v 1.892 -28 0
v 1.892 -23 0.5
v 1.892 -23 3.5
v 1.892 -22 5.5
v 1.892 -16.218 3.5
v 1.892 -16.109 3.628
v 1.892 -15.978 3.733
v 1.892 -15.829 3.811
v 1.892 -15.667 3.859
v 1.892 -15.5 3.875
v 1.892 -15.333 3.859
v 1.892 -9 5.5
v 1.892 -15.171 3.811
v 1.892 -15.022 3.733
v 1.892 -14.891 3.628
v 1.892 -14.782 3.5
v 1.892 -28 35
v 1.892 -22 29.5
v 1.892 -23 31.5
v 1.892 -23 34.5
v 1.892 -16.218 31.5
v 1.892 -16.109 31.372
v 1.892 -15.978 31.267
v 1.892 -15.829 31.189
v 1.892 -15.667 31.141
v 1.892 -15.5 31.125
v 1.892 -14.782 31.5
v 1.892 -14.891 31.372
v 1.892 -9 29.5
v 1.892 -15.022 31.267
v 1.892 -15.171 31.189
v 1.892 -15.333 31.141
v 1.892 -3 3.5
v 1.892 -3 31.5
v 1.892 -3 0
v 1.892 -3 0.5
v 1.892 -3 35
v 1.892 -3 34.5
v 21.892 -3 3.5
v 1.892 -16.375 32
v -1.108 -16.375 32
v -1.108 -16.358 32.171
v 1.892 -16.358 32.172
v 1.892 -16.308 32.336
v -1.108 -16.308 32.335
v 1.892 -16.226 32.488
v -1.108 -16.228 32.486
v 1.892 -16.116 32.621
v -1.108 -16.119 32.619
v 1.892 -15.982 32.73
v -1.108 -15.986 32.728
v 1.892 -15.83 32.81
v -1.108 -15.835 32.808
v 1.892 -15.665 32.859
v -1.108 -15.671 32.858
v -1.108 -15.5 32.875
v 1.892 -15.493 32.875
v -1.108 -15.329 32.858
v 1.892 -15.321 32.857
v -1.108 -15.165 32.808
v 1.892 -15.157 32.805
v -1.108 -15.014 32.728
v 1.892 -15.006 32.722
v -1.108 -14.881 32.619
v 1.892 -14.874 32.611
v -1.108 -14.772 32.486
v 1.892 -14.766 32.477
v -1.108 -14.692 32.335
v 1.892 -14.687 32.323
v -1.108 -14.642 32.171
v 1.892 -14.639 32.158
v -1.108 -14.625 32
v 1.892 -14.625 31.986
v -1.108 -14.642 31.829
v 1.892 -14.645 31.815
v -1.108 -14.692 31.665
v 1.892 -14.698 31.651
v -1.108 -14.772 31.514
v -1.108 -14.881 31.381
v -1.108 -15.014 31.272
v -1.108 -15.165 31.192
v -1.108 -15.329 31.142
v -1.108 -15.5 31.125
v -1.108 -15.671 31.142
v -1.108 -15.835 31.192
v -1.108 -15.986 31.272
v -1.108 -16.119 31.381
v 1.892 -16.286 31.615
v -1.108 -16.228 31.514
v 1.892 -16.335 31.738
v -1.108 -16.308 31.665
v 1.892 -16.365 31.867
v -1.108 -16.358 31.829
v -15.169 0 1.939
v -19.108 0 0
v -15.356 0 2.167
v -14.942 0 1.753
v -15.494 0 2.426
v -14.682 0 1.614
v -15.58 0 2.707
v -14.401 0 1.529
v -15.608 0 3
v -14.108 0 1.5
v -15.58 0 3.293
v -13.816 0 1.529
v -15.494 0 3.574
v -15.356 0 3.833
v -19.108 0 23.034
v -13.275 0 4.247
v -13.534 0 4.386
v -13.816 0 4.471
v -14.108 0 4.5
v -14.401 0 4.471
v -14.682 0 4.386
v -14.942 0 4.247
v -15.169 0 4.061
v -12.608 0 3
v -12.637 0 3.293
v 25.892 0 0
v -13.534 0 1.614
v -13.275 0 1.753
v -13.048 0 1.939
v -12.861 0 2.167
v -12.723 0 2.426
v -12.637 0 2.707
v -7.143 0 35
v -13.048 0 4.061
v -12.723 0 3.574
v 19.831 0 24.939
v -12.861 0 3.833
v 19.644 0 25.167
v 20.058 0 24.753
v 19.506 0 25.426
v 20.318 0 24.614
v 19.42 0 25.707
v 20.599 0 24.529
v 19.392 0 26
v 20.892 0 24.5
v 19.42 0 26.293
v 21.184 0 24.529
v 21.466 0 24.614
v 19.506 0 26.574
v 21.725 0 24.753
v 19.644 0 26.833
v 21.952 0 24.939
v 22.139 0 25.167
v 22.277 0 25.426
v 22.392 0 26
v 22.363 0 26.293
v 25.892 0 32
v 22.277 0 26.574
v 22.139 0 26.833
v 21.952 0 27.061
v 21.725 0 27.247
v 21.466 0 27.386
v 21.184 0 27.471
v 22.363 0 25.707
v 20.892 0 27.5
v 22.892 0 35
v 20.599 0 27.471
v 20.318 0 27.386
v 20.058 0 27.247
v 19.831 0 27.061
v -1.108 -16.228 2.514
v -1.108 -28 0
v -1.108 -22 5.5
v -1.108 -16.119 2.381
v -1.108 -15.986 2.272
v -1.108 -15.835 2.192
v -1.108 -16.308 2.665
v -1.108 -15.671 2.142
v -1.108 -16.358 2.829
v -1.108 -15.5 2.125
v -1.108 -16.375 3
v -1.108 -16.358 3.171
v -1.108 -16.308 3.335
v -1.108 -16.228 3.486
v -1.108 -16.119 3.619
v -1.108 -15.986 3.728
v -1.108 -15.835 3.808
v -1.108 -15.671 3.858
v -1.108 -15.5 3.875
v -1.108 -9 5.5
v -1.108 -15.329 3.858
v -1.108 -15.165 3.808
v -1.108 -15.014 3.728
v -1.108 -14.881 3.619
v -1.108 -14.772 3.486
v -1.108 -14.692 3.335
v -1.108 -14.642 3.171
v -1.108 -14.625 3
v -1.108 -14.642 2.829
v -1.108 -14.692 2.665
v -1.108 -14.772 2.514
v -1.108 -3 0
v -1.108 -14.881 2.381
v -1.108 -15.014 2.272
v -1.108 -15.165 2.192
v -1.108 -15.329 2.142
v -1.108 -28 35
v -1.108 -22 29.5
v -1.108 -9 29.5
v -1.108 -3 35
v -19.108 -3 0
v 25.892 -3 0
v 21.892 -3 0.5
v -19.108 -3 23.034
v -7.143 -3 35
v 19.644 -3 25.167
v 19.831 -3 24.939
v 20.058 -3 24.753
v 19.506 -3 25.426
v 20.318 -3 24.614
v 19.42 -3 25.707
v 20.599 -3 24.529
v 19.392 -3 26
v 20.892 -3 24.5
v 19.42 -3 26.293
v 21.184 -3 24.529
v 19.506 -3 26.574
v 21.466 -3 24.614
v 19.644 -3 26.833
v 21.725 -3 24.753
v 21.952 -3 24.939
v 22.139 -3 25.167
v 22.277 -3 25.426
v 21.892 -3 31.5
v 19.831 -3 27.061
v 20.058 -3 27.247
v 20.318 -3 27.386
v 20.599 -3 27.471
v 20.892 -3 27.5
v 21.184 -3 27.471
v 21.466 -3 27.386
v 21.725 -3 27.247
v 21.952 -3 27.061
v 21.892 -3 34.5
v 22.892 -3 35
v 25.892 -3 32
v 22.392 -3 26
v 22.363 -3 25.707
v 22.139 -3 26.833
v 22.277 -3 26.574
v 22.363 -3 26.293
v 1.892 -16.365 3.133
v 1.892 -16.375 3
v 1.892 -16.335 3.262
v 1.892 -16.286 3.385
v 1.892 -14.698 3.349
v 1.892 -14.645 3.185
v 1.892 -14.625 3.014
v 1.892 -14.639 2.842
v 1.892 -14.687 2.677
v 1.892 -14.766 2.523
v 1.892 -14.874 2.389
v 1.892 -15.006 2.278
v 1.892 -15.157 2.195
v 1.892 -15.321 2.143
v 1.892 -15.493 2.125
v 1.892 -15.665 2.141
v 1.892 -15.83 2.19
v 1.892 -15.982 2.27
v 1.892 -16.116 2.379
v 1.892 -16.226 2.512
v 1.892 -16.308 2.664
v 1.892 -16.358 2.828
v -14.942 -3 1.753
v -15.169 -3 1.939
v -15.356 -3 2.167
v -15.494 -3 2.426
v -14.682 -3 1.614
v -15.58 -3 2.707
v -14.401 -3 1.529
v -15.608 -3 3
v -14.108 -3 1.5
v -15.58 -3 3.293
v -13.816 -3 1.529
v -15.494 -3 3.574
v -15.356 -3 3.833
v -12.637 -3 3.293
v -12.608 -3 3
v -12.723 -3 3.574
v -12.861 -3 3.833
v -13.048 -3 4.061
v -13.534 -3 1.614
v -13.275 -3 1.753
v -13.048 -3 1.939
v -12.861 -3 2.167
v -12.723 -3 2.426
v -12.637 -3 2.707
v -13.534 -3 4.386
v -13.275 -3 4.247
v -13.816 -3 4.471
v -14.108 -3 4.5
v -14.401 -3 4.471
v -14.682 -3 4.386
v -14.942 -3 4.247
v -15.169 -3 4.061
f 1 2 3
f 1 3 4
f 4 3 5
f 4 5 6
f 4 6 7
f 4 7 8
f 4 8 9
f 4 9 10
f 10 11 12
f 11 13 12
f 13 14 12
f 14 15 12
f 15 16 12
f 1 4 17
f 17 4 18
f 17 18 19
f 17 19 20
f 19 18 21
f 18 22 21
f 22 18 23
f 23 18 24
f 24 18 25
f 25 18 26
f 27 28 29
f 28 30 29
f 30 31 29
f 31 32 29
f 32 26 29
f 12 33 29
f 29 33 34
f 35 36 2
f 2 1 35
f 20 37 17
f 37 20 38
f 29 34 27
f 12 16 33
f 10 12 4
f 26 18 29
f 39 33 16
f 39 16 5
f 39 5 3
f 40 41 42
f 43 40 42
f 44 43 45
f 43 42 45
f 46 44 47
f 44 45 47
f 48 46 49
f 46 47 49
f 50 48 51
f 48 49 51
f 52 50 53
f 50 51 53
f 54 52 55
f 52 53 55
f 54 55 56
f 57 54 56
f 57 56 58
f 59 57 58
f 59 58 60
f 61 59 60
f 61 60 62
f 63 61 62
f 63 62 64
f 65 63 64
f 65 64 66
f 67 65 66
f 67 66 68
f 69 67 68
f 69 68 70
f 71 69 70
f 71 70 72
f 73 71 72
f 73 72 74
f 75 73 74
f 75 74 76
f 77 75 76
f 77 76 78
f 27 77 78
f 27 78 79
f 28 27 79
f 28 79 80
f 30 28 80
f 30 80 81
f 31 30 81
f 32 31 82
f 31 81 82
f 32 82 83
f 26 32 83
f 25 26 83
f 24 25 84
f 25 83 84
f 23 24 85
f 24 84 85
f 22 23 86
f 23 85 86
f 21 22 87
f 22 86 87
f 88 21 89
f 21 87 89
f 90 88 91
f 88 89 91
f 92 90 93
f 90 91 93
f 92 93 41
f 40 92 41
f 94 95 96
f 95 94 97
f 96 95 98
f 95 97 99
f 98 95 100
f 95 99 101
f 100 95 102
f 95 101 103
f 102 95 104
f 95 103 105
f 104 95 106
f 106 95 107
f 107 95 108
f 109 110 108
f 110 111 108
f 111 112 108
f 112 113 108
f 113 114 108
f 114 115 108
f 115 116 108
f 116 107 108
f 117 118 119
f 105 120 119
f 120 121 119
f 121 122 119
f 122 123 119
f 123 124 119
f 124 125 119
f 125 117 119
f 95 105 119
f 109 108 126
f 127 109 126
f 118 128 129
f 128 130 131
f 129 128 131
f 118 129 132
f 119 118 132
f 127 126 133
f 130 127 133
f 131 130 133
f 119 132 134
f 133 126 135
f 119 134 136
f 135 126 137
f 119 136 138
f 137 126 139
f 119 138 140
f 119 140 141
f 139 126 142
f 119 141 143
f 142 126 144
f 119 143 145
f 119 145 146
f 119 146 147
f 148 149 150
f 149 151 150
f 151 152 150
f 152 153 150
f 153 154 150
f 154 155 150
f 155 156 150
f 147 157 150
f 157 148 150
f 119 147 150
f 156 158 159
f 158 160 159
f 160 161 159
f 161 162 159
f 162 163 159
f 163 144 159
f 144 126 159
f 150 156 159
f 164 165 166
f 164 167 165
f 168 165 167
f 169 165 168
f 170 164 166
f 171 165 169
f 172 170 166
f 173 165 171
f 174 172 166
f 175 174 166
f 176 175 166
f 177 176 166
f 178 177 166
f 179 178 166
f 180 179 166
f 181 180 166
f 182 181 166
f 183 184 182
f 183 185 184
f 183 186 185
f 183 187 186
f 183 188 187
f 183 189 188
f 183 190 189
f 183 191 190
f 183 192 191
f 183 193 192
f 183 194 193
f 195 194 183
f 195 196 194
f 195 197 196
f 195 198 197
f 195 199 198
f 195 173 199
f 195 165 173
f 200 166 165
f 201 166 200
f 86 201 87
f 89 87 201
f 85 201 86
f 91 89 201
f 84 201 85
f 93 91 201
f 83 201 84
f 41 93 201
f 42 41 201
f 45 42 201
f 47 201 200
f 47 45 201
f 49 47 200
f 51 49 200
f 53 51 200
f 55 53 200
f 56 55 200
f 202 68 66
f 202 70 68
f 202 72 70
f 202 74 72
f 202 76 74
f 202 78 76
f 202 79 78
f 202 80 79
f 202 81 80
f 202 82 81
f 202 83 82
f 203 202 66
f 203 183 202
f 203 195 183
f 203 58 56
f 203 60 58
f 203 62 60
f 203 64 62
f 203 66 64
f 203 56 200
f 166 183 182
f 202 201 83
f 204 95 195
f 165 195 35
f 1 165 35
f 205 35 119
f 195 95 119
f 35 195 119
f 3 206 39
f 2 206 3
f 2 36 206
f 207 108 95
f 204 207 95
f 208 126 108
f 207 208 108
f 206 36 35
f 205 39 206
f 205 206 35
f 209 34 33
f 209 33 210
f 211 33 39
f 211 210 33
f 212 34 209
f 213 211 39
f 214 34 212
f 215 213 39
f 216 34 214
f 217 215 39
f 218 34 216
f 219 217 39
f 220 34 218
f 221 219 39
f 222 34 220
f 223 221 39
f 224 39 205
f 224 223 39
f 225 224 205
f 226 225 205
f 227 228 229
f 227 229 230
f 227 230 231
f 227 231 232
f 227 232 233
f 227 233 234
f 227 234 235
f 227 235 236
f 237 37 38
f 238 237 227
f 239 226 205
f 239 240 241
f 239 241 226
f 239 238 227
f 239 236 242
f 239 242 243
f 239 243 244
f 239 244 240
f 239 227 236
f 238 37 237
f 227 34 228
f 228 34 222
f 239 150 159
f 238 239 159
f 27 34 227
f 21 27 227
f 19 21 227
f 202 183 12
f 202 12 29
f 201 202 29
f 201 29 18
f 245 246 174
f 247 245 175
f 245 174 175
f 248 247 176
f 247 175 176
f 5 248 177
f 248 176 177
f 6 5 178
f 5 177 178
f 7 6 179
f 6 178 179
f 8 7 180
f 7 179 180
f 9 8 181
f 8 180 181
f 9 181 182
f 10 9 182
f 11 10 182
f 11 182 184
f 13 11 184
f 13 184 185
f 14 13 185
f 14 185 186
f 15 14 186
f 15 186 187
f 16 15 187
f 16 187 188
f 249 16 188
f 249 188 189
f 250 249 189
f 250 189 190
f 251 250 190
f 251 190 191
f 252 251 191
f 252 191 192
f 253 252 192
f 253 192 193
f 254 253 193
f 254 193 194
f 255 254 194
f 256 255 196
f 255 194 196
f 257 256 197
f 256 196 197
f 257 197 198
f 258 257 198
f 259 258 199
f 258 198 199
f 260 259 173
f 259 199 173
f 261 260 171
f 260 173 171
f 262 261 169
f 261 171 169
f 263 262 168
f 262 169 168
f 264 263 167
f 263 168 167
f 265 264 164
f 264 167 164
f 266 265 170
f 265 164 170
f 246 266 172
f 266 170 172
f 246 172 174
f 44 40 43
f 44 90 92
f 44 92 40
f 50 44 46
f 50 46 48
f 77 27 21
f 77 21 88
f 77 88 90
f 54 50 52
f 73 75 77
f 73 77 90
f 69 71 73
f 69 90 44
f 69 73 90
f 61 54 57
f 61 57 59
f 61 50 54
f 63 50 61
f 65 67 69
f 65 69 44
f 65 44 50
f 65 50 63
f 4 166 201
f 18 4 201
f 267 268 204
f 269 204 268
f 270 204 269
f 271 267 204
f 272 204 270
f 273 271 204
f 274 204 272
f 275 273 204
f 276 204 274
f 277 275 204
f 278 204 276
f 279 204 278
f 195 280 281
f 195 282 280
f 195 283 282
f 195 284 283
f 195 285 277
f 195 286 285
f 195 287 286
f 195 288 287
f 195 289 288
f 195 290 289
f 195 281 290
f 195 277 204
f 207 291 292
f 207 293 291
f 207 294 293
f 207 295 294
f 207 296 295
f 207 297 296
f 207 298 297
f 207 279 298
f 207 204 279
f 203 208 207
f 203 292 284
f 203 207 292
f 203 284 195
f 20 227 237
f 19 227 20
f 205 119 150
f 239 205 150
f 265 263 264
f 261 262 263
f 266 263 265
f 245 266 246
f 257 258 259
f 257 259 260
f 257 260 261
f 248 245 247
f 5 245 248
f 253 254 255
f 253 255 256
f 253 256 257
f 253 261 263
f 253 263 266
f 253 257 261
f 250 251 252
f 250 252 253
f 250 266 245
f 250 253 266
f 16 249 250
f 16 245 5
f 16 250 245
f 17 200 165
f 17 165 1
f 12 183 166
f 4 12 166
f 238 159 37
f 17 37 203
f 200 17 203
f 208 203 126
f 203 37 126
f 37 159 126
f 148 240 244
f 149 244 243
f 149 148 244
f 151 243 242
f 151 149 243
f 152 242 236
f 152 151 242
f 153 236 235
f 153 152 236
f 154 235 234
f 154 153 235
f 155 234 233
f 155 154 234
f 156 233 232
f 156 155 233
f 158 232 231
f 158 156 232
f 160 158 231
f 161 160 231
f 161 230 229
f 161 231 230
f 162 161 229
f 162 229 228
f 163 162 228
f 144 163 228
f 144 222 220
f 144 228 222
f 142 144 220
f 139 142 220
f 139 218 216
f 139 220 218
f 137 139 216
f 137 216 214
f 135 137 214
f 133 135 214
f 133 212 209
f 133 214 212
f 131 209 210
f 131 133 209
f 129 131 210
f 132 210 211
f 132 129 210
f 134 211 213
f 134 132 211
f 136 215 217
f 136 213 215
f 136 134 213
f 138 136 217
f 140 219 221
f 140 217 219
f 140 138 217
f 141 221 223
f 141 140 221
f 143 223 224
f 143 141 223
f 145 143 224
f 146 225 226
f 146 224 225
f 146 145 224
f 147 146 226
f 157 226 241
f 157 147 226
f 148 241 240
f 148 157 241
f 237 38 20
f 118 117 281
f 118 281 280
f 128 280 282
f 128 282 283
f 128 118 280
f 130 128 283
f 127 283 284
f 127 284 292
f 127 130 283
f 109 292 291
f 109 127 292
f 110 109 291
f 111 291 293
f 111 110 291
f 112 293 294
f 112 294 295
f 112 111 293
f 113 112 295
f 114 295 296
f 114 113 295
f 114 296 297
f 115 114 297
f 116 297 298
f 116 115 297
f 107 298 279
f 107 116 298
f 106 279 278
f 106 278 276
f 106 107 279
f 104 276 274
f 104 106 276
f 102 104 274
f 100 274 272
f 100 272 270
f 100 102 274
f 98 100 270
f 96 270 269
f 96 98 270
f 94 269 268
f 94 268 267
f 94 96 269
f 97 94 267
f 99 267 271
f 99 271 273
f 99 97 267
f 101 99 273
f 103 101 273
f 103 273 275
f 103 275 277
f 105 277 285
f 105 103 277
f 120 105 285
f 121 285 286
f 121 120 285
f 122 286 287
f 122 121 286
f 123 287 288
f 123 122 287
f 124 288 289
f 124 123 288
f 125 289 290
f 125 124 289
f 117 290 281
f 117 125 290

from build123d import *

# Parameters (mm, degrees)
F0_R        = 1.5
F1_DEPTH    = 3
F2_W        = 3
F2_H        = 35
F3_DEPTH    = 25
F4_W        = 13
F4_H        = 24
F4_R        = 0.875
F5_DEPTH    = 27.001
F6_W        = 20
F6_H        = 3
F7_DEPTH    = 23
F8_T4_DEPTH = 121.2974174464


# Not quite as in the source:
# - a fillet or chamfer that OpenCascade refuses, or shapes differently, is made with other operations: its cross-section is extruded or revolved along the edge and cut away or added
# - a feature of the source that left no trace in its solid (it failed there, or was rolled back) is left out


with BuildPart() as f1:
    # F0 (on Front) → F1 (new body)
    with BuildSketch(Plane.XZ):
        Polygon((-19.1084720148, 23.034380586), (-19.1084720148, 0), (25.8915279852, 0), (25.8915279852, 32), (22.8915279852, 35), (-7.1428526009, 35), align=None)
        with Locations((-14.1084720148, 3)):
            Circle(F0_R, mode=Mode.SUBTRACT)
        with Locations((20.8915279852, 26)):
            Circle(F0_R, mode=Mode.SUBTRACT)
    extrude(amount=F1_DEPTH)

    # F2 (on face) → F3 (join)
    with BuildSketch(Plane.XZ.offset(3)):
        with Locations((0.3915279852, 17.5)):
            Rectangle(F2_W, F2_H)
    extrude(amount=F3_DEPTH)

    # F4 (on face) → F5 (cut, through all)
    with BuildSketch(Plane(origin=(-1.1084720148, 0, 0), x_dir=(0, -1, 0), z_dir=(-1, 0, 0))):
        with Locations((15.5, 17.5)):
            Rectangle(F4_W, F4_H)
        with Locations((15.5, 32)):
            Circle(F4_R)
        with Locations((15.5, 3)):
            Circle(F4_R)
    extrude(amount=-F5_DEPTH, mode=Mode.SUBTRACT)

    # F6 (on face) → F7 (join)
    with BuildSketch(Plane.XZ.offset(3)):
        with Locations((11.8915279852, 33)):
            Rectangle(F6_W, F6_H)
        with Locations((11.8915279852, 2)):
            Rectangle(F6_W, F6_H)
    extrude(amount=F7_DEPTH)

    # F8: chamfer of 23 on 1 edges, made by hand


with BuildPart() as f8_tool2:
    # F8_s3 → F8_t4 (new body)
    with BuildSketch(Plane.XY.offset(-58.6487087232)):
        Polygon((21.8915279852, -3), (-1.1084720148, -26), (21.8915279852, -26), align=None)
    extrude(amount=F8_T4_DEPTH)

    split(bisect_by=Plane.XZ.offset(3), keep=Keep.TOP)

    split(bisect_by=Plane.YZ.offset(1.8915279852), keep=Keep.TOP)


with BuildPart() as f1_1:
    add(f1.part)

    # F8_t1: cut F8_tool2
    add(f8_tool2.part, mode=Mode.SUBTRACT)


solid = f1_1.part
